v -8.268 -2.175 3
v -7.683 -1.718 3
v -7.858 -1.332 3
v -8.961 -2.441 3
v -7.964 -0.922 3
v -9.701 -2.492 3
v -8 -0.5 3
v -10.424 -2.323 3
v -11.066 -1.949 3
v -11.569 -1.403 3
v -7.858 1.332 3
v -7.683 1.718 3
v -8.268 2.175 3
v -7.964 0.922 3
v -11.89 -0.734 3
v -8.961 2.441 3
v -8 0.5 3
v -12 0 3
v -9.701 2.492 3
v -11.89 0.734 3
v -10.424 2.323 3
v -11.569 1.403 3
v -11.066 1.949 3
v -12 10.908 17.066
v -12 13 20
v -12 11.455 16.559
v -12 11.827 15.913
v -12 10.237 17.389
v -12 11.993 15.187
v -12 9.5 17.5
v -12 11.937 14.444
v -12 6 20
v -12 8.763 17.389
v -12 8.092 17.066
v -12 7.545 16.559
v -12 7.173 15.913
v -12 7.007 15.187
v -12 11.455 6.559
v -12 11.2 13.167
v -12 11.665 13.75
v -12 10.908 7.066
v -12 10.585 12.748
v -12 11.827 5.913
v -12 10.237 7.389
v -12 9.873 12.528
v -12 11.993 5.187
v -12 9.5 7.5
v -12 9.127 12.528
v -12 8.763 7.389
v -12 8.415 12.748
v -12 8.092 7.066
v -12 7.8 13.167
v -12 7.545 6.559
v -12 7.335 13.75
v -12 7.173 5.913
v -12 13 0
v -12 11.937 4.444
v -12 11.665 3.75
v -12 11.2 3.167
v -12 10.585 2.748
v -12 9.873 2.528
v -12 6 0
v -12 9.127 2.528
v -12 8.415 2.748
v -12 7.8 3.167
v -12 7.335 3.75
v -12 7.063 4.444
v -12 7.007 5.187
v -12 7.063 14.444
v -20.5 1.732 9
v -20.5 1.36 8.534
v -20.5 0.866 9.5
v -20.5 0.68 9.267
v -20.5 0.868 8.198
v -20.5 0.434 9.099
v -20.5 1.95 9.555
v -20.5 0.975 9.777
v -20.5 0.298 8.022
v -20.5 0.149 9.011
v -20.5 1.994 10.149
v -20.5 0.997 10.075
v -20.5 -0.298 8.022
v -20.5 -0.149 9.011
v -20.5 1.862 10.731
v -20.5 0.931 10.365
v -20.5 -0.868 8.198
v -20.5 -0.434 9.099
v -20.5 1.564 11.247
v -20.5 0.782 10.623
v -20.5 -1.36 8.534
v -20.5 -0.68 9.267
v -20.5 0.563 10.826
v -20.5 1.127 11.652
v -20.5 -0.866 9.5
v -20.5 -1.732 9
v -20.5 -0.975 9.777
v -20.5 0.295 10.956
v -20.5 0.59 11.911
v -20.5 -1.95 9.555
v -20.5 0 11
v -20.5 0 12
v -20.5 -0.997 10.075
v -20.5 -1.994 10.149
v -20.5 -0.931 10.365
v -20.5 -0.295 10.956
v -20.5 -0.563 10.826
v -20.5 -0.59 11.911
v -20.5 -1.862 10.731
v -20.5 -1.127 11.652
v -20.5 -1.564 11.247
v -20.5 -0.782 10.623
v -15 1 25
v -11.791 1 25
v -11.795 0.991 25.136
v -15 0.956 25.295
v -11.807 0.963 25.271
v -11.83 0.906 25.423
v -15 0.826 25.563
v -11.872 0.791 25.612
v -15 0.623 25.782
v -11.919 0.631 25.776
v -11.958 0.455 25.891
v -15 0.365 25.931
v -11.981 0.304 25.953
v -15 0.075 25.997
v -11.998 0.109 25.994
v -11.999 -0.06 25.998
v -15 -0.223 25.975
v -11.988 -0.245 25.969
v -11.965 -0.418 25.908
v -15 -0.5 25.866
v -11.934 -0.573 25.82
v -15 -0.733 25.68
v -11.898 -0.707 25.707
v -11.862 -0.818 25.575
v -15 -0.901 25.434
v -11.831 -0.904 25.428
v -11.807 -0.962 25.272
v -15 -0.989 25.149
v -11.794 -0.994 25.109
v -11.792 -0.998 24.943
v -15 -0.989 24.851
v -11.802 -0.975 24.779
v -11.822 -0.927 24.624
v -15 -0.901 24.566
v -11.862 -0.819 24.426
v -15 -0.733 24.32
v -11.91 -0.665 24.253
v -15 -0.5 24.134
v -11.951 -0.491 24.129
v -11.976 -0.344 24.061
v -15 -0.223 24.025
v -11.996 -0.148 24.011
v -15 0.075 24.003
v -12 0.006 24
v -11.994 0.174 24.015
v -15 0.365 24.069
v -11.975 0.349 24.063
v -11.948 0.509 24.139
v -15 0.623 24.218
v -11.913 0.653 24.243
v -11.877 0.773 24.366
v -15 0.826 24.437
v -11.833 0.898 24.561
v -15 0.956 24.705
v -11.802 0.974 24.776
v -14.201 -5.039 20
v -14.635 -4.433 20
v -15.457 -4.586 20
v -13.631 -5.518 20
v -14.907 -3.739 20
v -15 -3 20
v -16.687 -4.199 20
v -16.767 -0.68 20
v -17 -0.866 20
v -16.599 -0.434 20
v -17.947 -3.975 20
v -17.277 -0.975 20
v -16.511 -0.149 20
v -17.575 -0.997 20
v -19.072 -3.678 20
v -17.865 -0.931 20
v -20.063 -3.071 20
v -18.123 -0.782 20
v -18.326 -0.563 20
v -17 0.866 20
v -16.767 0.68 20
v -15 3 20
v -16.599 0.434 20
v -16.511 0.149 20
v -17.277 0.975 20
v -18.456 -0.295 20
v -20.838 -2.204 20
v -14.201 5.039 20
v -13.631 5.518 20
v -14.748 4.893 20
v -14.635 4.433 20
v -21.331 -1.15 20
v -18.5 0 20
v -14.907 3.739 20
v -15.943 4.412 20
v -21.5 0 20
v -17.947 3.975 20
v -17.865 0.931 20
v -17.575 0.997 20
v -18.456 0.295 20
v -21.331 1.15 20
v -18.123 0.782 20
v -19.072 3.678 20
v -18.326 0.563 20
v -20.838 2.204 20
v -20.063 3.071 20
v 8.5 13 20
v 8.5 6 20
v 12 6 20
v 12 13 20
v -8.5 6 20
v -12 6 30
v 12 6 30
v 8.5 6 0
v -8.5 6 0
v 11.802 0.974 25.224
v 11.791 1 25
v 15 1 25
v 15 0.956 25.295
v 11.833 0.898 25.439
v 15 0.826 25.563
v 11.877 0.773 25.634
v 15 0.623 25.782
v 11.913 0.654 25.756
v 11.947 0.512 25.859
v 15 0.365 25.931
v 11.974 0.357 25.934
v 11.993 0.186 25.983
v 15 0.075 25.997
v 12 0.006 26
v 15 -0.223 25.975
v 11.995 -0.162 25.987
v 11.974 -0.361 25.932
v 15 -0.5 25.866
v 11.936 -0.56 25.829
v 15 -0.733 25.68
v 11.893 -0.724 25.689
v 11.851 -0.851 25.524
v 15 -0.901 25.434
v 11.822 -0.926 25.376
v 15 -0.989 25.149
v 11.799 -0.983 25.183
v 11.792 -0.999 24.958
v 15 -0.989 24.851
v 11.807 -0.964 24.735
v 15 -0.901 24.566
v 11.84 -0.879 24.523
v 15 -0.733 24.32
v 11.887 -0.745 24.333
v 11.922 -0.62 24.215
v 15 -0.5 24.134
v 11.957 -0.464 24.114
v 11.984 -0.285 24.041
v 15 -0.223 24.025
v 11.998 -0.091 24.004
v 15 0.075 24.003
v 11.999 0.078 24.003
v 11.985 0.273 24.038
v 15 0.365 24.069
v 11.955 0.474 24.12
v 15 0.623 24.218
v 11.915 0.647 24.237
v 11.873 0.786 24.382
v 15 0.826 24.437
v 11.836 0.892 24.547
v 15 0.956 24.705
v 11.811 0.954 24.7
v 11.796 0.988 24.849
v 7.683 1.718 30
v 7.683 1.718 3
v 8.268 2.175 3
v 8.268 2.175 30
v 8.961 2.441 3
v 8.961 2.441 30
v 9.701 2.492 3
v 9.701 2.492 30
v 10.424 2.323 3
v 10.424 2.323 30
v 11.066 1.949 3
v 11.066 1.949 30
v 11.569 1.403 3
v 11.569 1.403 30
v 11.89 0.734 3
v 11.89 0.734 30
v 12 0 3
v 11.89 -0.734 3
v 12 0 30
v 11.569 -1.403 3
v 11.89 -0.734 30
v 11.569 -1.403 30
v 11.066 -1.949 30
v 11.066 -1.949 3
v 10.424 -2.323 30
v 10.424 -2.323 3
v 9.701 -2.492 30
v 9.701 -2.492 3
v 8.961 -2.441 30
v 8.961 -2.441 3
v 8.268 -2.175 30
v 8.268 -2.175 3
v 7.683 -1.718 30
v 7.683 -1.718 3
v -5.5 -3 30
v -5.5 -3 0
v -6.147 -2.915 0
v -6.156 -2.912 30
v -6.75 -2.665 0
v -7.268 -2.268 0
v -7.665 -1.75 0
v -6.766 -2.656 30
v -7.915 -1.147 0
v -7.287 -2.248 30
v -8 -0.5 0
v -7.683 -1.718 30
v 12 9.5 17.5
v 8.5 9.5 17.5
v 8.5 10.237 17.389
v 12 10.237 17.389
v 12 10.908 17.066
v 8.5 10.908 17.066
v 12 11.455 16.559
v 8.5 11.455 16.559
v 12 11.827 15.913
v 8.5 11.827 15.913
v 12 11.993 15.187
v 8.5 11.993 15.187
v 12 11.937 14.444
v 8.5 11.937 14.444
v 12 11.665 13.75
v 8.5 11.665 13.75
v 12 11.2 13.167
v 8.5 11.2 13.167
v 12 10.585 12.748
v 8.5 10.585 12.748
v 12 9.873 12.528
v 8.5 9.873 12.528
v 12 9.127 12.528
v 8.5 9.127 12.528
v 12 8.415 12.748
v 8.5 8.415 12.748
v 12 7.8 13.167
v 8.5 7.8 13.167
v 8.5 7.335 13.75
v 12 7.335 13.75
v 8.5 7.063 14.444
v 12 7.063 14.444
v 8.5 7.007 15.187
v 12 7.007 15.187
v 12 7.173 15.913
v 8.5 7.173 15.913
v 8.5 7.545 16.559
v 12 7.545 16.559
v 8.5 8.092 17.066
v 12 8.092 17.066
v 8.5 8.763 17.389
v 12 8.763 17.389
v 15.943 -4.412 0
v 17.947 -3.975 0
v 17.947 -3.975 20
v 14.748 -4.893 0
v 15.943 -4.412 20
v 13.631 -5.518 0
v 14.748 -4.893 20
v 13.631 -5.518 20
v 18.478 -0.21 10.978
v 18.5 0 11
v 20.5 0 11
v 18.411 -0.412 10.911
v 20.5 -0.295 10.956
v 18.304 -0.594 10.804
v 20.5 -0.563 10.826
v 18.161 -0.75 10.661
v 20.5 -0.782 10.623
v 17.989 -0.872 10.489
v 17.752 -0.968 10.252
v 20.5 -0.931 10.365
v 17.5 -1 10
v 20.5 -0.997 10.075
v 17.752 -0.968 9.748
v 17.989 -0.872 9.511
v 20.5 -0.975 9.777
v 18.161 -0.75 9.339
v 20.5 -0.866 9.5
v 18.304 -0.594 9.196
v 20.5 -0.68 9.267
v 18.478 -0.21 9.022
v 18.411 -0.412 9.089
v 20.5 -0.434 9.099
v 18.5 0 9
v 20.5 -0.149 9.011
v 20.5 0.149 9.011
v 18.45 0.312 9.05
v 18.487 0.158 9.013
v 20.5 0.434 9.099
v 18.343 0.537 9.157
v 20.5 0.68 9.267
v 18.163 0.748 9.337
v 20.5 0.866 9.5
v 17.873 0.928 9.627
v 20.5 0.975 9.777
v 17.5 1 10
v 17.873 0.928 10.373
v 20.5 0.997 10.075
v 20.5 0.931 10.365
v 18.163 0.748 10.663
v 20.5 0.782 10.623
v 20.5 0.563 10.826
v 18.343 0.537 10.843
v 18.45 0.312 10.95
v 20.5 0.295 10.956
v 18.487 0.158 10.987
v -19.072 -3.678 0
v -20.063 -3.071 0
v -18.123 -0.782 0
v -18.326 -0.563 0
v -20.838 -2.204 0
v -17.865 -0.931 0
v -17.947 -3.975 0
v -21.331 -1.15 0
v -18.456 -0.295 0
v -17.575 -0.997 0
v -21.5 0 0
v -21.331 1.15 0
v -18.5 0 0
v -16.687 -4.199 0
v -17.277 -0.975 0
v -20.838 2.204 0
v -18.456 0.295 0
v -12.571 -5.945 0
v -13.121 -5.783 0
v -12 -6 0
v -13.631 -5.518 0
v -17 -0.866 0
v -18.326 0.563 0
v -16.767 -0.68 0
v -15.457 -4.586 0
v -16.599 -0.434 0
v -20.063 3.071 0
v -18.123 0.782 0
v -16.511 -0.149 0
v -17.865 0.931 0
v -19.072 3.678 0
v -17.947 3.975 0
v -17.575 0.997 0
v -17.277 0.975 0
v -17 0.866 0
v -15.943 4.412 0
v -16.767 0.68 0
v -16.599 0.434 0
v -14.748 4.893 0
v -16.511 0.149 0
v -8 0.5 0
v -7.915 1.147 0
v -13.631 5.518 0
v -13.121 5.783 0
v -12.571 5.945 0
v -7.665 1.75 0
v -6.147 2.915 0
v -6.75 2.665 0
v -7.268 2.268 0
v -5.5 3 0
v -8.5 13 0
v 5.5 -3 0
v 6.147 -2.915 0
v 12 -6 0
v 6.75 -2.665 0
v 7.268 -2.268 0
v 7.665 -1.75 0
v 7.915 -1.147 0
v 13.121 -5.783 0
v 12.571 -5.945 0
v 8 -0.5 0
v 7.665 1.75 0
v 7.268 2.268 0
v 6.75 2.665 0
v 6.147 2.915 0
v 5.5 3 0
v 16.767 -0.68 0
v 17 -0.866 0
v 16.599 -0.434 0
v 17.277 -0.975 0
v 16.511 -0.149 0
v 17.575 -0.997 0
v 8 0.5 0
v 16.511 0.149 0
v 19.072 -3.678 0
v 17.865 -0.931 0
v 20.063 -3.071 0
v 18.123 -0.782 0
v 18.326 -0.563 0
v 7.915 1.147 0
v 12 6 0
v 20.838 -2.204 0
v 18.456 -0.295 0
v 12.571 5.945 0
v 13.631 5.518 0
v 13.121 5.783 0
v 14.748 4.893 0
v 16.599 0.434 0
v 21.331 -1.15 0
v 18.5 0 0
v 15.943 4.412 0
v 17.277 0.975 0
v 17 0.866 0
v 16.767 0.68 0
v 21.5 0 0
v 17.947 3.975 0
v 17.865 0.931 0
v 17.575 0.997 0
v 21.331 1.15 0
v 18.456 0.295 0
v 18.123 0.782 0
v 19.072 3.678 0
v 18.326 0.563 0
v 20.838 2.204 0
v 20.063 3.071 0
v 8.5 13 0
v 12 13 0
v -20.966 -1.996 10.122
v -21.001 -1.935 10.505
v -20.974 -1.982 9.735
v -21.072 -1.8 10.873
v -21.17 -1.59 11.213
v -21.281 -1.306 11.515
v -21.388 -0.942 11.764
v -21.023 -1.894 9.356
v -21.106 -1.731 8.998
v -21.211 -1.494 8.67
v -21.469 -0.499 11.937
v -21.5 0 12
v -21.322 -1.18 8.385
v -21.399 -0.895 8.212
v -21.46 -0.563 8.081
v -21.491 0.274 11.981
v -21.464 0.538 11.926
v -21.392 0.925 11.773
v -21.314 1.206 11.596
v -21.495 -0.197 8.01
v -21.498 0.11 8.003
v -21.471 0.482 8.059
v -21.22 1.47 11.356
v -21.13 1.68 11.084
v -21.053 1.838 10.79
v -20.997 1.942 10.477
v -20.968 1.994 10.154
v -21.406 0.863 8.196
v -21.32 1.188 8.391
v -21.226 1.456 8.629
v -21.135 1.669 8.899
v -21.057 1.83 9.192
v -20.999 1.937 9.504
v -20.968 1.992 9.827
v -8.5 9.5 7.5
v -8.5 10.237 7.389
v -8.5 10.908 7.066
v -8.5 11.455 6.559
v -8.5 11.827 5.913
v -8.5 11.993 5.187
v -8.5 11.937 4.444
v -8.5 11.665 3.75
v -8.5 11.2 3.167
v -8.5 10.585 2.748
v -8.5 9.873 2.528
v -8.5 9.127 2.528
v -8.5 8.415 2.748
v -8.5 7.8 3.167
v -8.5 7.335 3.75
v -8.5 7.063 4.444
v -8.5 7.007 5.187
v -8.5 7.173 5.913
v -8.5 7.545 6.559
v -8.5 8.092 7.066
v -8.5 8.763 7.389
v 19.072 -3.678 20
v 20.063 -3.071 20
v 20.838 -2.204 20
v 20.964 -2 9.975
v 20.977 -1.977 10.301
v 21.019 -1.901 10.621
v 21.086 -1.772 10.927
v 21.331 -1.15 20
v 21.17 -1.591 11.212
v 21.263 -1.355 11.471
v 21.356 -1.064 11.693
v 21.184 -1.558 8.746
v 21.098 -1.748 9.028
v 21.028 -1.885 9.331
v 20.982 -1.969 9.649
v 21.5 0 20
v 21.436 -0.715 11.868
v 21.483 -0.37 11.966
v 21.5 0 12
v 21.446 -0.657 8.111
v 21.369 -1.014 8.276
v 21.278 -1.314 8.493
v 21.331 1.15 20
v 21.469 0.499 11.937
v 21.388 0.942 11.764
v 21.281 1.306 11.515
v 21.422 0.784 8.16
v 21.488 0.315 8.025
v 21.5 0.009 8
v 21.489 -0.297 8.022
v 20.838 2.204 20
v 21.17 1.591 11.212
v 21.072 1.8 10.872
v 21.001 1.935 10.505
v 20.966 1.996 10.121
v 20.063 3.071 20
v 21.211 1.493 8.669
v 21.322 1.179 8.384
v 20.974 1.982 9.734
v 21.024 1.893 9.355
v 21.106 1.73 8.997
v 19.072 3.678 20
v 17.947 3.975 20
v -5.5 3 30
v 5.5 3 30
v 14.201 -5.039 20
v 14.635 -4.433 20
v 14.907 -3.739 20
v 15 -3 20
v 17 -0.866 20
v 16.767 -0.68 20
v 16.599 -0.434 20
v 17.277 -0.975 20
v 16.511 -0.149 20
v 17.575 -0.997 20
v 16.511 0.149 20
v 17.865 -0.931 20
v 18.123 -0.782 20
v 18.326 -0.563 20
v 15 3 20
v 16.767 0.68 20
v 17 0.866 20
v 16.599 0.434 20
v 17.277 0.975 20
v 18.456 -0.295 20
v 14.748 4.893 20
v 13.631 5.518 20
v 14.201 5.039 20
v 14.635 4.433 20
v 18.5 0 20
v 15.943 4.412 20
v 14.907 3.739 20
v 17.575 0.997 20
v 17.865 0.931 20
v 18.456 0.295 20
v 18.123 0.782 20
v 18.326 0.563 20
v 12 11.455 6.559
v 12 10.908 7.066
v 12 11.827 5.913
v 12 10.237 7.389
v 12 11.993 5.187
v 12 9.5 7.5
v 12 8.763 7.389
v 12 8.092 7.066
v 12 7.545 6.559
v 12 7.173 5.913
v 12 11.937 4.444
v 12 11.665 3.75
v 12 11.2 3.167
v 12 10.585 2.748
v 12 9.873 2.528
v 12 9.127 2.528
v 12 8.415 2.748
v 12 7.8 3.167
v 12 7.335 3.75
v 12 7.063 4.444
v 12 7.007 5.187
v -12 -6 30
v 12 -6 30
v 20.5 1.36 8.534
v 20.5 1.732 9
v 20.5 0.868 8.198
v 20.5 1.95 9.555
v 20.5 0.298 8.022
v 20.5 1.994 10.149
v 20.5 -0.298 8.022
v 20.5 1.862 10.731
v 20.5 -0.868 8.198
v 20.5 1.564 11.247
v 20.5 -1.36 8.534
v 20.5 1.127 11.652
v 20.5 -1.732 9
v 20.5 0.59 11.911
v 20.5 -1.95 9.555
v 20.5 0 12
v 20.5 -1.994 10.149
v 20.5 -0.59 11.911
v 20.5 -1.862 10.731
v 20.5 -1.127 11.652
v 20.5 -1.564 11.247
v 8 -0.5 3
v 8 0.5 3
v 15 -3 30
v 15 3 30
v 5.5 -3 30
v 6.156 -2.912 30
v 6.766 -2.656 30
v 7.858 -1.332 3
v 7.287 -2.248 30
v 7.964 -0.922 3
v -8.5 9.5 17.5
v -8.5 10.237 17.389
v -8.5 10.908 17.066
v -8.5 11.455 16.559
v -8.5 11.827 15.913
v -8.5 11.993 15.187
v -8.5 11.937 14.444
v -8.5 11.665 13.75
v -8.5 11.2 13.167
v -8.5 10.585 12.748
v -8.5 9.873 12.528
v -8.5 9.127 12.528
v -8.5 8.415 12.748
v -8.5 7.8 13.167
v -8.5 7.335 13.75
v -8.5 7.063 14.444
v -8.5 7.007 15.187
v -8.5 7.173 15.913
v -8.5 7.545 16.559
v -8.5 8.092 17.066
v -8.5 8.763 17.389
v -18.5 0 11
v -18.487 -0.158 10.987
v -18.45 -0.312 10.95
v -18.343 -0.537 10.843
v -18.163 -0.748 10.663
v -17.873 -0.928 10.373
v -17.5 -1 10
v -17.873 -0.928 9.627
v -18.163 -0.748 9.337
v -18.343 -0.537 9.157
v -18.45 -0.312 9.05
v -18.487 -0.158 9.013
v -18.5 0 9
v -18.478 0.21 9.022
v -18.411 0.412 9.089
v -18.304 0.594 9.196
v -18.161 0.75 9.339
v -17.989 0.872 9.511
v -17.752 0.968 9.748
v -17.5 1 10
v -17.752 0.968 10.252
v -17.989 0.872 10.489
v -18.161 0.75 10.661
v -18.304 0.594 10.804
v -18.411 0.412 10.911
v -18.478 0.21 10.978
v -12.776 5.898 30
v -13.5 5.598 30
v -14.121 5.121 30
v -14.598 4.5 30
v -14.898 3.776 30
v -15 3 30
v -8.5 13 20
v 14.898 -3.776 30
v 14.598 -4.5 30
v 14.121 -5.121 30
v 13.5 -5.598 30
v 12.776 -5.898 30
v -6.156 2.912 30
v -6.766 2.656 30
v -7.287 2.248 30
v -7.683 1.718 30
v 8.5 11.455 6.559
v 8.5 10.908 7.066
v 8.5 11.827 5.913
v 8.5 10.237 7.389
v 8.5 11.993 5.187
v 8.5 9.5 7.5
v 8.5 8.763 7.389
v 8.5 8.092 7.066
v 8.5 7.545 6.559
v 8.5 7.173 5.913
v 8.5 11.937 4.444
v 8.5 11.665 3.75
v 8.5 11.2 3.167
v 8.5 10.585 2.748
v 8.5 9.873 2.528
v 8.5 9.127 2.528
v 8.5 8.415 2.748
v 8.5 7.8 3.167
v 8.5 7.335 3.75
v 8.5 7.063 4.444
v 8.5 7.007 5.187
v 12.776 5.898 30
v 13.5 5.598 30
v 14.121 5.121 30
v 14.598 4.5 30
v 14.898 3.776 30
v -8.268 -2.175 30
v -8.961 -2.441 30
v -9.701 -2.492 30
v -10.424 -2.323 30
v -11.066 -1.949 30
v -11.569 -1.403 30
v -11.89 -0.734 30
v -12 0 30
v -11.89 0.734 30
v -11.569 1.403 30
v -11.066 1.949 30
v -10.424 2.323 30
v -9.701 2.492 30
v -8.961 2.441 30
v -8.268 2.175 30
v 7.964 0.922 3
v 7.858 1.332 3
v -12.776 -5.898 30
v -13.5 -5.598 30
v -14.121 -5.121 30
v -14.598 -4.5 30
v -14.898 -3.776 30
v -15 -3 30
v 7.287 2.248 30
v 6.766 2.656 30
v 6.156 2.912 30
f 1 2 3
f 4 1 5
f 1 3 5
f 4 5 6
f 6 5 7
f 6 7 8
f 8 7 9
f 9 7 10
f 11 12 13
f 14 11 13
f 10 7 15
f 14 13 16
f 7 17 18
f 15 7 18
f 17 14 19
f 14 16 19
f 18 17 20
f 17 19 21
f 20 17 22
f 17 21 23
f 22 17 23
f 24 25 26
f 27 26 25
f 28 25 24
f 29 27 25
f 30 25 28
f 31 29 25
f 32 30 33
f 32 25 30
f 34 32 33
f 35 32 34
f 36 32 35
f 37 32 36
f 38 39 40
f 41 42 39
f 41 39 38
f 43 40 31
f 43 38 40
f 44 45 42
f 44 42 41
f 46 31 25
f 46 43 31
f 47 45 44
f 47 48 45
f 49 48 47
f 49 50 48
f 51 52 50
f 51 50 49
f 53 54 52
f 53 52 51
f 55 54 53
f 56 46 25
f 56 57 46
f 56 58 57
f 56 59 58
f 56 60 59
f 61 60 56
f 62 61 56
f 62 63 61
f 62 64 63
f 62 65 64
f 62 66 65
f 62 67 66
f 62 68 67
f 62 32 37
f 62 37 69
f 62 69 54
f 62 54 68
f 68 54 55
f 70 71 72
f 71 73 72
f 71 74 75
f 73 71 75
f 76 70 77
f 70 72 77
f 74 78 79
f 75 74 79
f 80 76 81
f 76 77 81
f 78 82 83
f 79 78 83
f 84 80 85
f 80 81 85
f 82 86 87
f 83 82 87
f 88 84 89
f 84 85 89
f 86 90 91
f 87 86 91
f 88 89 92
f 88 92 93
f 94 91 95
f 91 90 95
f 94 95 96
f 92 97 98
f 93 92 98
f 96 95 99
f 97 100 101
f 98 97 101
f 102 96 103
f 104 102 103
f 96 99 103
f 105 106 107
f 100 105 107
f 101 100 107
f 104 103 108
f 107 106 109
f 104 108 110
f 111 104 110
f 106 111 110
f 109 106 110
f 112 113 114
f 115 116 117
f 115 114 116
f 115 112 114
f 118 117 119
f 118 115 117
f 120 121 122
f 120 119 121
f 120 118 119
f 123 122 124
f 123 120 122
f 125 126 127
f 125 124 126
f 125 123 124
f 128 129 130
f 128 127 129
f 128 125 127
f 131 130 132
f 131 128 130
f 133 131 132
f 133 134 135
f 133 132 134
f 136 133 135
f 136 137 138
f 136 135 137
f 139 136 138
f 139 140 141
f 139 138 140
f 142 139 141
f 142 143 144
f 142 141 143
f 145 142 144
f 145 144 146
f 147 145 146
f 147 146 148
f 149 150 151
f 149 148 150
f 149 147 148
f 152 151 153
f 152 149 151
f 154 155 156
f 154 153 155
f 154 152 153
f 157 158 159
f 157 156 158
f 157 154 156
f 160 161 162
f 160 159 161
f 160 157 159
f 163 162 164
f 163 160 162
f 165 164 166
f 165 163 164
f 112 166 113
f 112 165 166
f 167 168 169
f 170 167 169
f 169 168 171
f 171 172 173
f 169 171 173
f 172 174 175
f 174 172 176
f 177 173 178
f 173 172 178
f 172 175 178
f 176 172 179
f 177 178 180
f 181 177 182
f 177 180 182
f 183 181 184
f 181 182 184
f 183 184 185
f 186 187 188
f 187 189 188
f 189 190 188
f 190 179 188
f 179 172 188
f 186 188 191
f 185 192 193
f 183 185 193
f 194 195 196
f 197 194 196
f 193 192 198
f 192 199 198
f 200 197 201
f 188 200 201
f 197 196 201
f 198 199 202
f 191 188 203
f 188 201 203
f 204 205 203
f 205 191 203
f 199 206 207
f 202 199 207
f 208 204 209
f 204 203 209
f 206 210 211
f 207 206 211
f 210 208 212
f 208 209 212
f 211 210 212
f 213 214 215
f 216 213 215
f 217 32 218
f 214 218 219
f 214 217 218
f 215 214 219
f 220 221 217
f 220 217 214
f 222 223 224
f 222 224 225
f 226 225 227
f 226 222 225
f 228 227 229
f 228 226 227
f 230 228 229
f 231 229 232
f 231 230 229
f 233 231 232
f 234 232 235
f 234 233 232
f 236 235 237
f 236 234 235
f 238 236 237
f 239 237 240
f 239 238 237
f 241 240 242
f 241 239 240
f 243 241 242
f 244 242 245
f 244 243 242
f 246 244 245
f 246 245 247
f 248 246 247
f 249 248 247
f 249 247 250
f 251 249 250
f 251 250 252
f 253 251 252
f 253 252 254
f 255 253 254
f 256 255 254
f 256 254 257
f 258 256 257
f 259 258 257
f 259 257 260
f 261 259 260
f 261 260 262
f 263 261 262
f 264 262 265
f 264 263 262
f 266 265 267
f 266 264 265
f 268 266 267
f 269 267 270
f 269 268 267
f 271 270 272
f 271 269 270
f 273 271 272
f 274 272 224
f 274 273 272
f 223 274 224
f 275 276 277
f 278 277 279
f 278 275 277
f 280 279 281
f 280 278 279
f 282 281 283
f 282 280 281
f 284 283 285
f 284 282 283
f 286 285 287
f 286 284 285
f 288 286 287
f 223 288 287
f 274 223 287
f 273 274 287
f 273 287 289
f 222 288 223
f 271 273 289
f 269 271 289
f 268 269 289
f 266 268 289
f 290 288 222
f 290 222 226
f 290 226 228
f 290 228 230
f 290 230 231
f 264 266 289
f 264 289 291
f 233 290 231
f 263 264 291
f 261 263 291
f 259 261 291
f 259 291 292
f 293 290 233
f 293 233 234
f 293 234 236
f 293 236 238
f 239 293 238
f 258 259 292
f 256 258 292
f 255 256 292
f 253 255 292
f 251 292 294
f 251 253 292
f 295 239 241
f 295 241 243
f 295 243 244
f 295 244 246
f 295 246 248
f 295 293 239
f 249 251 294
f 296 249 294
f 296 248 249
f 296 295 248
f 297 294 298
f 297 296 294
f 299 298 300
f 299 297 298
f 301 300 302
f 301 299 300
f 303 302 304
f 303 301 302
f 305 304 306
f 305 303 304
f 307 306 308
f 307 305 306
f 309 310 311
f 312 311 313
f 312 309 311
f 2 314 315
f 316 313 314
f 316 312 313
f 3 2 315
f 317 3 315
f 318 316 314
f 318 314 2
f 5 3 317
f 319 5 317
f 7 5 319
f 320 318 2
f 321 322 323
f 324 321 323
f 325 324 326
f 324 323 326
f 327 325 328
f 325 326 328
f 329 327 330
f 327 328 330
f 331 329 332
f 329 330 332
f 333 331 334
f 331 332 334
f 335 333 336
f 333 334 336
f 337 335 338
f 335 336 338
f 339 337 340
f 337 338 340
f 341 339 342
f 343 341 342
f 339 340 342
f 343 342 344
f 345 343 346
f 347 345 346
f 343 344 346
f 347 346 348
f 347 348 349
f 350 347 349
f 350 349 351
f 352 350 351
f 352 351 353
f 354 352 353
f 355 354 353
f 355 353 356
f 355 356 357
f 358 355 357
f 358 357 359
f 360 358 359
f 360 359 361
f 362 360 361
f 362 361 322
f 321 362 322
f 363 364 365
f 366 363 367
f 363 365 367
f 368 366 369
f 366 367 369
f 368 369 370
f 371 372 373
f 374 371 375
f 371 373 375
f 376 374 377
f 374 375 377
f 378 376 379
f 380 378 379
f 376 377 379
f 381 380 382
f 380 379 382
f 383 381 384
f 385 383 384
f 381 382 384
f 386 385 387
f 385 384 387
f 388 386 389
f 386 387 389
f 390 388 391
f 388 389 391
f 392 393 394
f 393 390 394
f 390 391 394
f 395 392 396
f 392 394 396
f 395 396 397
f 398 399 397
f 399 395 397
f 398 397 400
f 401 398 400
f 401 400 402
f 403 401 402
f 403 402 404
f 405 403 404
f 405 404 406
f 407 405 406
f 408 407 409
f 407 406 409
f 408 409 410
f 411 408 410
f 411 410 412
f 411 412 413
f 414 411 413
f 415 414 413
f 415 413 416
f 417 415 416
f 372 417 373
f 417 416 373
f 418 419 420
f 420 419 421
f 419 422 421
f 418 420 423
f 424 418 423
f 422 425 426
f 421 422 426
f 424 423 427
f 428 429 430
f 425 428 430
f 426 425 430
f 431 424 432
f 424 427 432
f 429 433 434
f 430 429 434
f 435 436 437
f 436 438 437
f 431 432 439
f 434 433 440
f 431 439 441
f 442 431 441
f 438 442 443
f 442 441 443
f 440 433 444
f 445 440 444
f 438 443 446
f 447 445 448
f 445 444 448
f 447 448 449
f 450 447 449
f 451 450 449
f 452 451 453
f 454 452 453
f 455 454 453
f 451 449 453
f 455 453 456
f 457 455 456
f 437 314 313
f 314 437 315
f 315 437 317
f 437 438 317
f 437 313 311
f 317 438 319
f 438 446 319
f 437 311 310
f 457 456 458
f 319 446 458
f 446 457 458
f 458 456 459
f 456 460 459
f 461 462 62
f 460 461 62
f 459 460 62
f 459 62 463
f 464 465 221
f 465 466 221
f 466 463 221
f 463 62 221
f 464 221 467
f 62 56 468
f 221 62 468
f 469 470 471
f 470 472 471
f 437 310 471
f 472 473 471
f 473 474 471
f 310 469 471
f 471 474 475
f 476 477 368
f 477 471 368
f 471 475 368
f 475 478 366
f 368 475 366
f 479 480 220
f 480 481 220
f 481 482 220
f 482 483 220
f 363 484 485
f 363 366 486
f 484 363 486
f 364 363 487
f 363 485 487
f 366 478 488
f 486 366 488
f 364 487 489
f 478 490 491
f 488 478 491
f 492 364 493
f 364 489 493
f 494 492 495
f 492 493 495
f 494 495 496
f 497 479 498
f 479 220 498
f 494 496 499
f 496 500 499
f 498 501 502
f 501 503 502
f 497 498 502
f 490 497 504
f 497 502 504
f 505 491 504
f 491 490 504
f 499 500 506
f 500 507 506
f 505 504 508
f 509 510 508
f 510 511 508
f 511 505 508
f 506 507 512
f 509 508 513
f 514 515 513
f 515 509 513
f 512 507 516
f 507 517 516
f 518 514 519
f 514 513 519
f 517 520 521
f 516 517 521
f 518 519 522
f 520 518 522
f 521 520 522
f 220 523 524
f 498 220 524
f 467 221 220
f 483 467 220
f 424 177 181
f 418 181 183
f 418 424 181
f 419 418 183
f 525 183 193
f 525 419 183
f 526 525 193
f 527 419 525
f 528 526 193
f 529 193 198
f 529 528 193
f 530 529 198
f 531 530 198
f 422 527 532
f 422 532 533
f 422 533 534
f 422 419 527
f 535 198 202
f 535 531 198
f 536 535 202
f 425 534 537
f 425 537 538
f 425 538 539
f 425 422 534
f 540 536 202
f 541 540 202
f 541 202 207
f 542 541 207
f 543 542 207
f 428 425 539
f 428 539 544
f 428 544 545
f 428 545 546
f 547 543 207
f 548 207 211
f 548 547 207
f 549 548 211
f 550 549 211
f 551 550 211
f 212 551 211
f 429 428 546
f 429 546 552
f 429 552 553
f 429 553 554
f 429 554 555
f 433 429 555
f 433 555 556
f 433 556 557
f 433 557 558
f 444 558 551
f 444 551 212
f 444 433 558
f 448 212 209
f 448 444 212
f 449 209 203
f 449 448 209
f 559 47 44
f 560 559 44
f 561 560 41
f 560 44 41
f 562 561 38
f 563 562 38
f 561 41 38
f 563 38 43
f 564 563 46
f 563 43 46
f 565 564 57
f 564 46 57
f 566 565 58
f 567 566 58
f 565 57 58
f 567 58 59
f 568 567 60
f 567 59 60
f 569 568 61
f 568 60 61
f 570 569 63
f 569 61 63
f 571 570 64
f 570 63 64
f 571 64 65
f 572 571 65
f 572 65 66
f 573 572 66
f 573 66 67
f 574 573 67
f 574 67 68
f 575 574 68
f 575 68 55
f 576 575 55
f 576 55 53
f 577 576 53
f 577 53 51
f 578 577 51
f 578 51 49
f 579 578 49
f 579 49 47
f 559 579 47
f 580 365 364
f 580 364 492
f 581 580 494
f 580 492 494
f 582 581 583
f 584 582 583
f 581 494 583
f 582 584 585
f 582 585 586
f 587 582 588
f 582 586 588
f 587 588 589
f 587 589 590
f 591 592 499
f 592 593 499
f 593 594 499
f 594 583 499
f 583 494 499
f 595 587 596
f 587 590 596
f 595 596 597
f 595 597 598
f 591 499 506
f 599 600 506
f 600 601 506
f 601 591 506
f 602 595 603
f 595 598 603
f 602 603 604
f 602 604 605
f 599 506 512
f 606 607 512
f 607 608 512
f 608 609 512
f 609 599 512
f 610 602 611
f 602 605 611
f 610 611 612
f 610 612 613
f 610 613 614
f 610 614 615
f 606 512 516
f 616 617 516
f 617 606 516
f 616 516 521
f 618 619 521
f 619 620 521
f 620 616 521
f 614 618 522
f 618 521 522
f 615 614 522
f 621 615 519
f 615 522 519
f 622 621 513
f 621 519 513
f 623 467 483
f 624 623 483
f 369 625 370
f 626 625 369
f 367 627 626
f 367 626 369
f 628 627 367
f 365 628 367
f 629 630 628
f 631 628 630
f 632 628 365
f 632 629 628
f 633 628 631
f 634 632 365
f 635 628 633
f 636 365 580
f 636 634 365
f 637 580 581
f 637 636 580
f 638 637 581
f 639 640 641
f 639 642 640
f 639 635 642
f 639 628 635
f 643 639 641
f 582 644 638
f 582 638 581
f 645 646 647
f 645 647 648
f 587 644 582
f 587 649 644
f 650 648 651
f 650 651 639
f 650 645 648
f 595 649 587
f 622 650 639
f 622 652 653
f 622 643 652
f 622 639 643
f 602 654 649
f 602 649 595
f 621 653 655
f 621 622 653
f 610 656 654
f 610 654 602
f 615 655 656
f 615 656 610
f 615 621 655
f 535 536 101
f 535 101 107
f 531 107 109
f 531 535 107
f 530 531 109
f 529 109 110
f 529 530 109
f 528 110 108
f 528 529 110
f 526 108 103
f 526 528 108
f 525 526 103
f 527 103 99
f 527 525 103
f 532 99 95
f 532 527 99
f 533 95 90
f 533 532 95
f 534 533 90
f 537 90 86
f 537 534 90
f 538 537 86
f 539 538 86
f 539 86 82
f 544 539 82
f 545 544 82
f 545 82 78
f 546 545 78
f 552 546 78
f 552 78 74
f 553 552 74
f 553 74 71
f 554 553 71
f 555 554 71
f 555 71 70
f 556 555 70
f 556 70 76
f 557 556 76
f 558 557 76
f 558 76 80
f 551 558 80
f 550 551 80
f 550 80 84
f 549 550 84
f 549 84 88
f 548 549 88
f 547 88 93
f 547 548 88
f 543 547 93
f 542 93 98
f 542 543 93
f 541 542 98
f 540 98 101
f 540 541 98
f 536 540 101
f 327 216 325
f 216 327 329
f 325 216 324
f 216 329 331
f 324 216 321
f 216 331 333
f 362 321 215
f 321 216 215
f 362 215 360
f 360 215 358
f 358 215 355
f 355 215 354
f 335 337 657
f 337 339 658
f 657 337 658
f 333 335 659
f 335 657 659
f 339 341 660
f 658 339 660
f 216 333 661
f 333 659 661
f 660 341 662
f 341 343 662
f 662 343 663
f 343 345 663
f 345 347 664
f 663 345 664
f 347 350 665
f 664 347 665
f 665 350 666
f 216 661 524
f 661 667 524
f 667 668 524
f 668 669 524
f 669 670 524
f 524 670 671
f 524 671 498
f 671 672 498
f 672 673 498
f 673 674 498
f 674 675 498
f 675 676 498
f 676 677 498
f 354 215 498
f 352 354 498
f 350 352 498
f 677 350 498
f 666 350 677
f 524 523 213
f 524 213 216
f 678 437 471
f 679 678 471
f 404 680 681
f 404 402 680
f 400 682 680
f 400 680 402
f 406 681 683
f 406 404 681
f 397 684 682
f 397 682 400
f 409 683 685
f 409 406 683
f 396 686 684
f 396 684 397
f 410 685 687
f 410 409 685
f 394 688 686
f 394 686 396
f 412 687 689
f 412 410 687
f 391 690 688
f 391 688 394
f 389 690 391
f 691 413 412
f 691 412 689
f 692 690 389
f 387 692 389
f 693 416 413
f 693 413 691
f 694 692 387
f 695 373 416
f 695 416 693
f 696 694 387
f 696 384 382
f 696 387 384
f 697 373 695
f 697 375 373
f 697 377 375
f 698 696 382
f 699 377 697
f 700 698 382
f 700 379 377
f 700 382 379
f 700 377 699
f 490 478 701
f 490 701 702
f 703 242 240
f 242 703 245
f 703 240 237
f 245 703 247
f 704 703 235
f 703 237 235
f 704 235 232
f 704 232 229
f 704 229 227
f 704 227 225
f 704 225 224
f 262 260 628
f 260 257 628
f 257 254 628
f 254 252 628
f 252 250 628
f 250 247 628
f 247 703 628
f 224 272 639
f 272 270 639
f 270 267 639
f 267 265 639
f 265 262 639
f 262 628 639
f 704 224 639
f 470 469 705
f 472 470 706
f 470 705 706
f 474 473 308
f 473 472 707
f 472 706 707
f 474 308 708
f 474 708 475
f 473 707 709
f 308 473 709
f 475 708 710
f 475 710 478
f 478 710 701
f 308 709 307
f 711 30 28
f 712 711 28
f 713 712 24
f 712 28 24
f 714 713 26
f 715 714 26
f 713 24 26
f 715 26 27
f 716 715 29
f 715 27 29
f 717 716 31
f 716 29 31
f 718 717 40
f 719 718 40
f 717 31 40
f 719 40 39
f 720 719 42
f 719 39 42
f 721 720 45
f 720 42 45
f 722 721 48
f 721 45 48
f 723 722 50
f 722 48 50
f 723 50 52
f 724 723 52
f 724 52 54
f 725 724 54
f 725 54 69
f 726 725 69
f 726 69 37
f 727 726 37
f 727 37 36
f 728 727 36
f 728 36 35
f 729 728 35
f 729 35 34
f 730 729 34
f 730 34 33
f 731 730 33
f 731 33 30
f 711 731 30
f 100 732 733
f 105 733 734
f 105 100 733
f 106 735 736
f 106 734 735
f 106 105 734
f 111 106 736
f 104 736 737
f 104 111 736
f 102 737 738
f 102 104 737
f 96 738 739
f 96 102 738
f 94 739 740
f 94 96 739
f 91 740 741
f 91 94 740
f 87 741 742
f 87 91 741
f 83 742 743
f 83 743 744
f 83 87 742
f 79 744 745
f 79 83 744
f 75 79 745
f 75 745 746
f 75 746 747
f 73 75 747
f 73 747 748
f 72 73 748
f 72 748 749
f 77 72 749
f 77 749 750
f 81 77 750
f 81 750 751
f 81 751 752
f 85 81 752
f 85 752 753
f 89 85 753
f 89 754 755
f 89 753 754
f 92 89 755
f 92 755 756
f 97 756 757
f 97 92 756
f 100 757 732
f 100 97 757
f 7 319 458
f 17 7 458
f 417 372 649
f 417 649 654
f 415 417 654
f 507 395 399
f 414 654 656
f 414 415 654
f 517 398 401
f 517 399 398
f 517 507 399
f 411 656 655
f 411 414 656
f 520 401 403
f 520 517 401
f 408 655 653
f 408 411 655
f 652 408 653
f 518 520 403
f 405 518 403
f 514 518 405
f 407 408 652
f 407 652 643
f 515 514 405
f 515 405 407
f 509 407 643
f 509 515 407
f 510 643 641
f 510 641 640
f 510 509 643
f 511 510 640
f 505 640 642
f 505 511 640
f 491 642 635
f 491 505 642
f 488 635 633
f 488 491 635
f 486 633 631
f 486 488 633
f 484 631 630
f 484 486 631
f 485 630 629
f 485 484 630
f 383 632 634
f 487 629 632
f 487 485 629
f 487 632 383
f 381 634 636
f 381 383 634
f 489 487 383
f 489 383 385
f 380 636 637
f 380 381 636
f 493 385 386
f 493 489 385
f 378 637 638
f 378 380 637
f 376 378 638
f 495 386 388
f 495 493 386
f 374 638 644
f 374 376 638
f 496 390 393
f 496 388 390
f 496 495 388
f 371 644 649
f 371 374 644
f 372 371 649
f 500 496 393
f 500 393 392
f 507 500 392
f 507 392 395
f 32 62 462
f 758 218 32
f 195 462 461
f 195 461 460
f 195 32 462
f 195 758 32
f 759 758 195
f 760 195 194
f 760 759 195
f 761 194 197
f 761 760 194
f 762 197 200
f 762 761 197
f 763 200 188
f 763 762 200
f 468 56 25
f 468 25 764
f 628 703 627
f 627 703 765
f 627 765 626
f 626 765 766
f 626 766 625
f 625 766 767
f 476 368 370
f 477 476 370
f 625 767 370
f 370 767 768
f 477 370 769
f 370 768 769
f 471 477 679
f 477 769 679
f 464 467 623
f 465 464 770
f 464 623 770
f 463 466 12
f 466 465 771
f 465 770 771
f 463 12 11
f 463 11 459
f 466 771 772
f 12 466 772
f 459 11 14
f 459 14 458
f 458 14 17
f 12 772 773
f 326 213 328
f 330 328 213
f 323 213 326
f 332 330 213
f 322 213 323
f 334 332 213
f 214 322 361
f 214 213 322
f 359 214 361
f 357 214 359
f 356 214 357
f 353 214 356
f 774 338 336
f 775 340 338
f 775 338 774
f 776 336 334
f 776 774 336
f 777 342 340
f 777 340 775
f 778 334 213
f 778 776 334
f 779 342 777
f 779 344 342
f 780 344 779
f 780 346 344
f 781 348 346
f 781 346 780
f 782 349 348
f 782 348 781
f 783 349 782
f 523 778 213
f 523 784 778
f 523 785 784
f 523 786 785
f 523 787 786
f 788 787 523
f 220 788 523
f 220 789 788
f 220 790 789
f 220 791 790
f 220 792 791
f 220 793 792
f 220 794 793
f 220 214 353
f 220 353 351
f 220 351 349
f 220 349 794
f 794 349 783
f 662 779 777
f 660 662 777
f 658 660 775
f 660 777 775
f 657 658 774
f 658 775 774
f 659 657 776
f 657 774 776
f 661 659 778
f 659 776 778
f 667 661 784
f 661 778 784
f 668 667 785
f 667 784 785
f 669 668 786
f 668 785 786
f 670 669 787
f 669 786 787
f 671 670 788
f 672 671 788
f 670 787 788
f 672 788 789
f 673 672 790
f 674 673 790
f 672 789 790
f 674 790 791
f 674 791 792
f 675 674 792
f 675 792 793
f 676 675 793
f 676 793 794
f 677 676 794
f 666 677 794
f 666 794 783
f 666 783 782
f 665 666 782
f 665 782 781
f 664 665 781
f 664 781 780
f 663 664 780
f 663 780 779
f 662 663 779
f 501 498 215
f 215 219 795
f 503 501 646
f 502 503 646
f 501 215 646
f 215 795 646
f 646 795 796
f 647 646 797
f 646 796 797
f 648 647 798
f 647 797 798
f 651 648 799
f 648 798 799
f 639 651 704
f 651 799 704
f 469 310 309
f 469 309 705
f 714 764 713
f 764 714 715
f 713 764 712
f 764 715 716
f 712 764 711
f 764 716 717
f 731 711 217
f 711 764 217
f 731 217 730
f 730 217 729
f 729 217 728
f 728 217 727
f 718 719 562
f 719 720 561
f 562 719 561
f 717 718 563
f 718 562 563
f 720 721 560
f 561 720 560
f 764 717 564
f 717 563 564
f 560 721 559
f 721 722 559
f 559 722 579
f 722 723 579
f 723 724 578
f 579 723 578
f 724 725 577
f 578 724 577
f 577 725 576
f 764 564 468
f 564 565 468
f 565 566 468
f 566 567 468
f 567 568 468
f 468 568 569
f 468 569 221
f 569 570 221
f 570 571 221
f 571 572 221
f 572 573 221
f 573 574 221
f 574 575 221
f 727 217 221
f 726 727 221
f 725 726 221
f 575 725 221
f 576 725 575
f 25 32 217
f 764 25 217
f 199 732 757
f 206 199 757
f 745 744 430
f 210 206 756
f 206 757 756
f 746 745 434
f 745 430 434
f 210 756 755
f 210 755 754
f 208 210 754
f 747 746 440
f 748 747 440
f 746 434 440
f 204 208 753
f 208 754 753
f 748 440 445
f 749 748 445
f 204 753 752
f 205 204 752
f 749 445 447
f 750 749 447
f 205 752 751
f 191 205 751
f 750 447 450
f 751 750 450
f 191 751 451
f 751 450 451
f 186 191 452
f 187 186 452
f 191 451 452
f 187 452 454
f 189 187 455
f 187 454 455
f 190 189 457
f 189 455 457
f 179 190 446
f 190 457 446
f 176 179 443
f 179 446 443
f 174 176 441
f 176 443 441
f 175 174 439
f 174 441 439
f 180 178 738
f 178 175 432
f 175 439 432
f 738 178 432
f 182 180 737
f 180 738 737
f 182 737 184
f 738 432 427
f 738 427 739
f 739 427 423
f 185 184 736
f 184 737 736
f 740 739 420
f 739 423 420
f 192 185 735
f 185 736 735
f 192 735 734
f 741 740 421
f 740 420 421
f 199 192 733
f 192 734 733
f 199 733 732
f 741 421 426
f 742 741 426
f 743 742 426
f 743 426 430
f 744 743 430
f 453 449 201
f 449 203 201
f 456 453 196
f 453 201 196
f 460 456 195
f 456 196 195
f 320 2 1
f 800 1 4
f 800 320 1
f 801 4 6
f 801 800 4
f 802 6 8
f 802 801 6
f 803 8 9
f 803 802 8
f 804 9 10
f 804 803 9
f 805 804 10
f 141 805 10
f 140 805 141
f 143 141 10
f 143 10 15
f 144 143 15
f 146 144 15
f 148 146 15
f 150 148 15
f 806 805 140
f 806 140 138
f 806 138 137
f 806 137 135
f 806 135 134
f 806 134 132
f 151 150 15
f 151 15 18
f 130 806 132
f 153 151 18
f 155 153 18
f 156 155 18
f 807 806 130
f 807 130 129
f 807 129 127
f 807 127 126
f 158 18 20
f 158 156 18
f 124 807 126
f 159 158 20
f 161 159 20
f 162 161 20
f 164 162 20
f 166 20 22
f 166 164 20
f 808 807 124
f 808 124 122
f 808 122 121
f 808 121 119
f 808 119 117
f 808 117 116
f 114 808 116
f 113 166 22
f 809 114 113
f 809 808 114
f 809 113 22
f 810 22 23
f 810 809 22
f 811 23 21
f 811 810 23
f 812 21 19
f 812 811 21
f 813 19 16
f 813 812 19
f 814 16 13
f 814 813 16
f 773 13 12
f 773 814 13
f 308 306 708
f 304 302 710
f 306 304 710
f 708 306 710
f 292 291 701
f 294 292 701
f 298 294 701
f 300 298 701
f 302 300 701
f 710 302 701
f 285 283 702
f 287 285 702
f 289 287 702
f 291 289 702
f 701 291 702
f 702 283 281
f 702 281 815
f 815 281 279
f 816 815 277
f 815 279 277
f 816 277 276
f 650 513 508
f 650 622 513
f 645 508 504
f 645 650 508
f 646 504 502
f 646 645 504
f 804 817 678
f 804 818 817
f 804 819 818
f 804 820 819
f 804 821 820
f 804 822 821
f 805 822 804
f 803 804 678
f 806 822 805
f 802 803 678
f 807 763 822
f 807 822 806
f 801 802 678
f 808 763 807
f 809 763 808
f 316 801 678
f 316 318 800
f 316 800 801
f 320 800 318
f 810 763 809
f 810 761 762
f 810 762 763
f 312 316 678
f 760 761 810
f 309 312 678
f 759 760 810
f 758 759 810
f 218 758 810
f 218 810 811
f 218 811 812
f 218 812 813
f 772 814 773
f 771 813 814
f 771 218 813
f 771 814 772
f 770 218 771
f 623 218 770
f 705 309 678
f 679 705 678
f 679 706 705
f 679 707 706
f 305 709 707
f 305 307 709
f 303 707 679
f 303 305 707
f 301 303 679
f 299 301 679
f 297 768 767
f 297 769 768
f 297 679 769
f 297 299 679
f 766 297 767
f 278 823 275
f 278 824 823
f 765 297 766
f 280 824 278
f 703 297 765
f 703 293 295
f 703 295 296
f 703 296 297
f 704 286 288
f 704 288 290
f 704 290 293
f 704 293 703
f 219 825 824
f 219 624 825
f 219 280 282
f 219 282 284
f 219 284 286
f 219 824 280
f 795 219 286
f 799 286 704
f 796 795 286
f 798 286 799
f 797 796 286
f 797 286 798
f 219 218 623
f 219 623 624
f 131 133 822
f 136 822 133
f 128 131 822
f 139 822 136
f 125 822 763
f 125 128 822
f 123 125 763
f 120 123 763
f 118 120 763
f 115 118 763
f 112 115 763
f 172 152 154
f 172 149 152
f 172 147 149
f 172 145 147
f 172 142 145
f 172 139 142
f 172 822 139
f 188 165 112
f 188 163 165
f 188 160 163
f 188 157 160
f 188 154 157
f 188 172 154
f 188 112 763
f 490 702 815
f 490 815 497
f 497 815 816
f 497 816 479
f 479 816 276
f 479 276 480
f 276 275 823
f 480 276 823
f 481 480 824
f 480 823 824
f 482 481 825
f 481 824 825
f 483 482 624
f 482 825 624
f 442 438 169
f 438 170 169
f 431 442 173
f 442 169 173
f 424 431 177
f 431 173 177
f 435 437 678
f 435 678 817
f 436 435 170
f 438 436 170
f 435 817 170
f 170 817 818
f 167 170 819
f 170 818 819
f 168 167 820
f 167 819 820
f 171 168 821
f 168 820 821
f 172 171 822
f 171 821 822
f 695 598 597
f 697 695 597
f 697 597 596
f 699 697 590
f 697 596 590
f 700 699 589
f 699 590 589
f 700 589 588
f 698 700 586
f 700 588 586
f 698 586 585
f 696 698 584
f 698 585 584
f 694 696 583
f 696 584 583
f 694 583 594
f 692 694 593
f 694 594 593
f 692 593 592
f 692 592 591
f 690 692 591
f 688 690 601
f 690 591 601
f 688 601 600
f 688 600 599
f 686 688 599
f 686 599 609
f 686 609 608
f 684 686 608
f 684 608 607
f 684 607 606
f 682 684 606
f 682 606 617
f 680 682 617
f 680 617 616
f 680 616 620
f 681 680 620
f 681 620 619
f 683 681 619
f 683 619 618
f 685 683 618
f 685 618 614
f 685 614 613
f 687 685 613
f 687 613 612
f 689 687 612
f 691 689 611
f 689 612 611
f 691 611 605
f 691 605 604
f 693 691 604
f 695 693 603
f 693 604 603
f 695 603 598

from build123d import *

# Parameters (mm, degrees)
SKETCH1_W               = 30
SKETCH1_H               = 12
SKETCH1_W_2             = 16
SKETCH1_H_2             = 6
BOSS_EXTRUDE1_DEPTH     = 30
FILLET1_R               = 2.5
CUT_EXTRUDE6_DEPTH      = 43.848570571
CUT_EXTRUDE6_DEPTH_BACK = 43.848570571
SKETCH22_R              = 1
SKETCH18_R              = 2.5
SKETCH18_R_2            = 2
SKETCH18_R_3            = 0.85
CUT_EXTRUDE3_DEPTH      = 27
FILLET2_R               = 3
SKETCH23_W              = 3.5
SKETCH23_H              = 20
BOSS_EXTRUDE3_DEPTH     = 7
SKETCH24_R              = 2.5
CUT_EXTRUDE7_DEPTH      = 74
SKETCH19_R              = 4
SKETCH19_R_2            = 1
BOSS_EXTRUDE2_DEPTH     = 20
SKETCH25_R              = 1
CUT_EXTRUDE8_DEPTH      = 4
SKETCH26_R              = 2
CUT_EXTRUDE9_DEPTH      = 1
FILLET3_R               = 10


with BuildPart() as part:
    # Sketch1 → Boss-Extrude1 (new body)
    with BuildSketch(Plane.XY):
        Rectangle(SKETCH1_W, SKETCH1_H)
        Rectangle(SKETCH1_W_2, SKETCH1_H_2, mode=Mode.SUBTRACT)
    extrude(amount=BOSS_EXTRUDE1_DEPTH)

    # Fillet1
    fillet1_edges = [part.edges().sort_by_distance(p)[0] for p in [
        (8, -3, 15),
        (8, 3, 15),
        (-8, 3, 15),
        (-8, -3, 15),
    ]]
    fillet(fillet1_edges, radius=FILLET1_R)

    # Sketch22 → Cut-Extrude6 (cut, two sides: drawn at the far end of the back side and taken through both)
    with BuildSketch(Plane(origin=(15, 0, 0), x_dir=(0, 0, -1), z_dir=(1, 0, 0)).offset(-CUT_EXTRUDE6_DEPTH_BACK)):
        with Locations(Location((-25, 0, 0), (0, 0, 90))):
            Circle(SKETCH22_R)
    extrude(amount=CUT_EXTRUDE6_DEPTH + CUT_EXTRUDE6_DEPTH_BACK, mode=Mode.SUBTRACT)

    # Sketch18 → Cut-Extrude3 (cut)
    with BuildSketch(Plane(origin=(0, 0, 30), x_dir=(-1, 0, 0), z_dir=(0, 0, -1))):
        with Locations((-9.5, 0)):
            Circle(SKETCH18_R)
        with Locations((9.5, 0)):
            Circle(SKETCH18_R)
        Circle(SKETCH18_R_2)
        with Locations((4.5, 0)):
            Circle(SKETCH18_R_3)
        with Locations((-4.5, 0)):
            Circle(SKETCH18_R_3)
    extrude(amount=CUT_EXTRUDE3_DEPTH, mode=Mode.SUBTRACT)

    # Fillet2
    fillet2_edges = [part.edges().sort_by_distance(p)[0] for p in [
        (15, -6, 15),
        (-15, -6, 15),
        (-15, 6, 15),
        (15, 6, 15),
    ]]
    fillet(fillet2_edges, radius=FILLET2_R)

    # Sketch23 → Boss-Extrude3 (add)
    with BuildSketch(Plane(origin=(0, 6, 0), x_dir=(1, 0, 0), z_dir=(0, 1, 0))):
        with Locations((-10.25, -10)):
            Rectangle(SKETCH23_W, SKETCH23_H)
        with Locations((10.25, -10)):
            Rectangle(SKETCH23_W, SKETCH23_H)
    extrude(amount=BOSS_EXTRUDE3_DEPTH)

    # Sketch24 → Cut-Extrude7 (cut)
    with BuildSketch(Plane.ZY.offset(12)):
        with Locations((15, 9.5)):
            Circle(SKETCH24_R)
        with Locations((5, 9.5)):
            Circle(SKETCH24_R)
    extrude(amount=-CUT_EXTRUDE7_DEPTH, mode=Mode.SUBTRACT)

    # Sketch19 → Boss-Extrude2 (add)
    with BuildSketch(Plane(origin=(0, 0, 0), x_dir=(-1, 0, 0), z_dir=(0, 0, -1))):
        with Locations((17.5, 0)):
            Circle(SKETCH19_R)
        with Locations((17.5, 0)):
            Circle(SKETCH19_R_2, mode=Mode.SUBTRACT)
    boss_extrude2 = extrude(amount=-BOSS_EXTRUDE2_DEPTH)

    # Sketch25 → Cut-Extrude8 (cut)
    with BuildSketch(Plane(origin=(-21.5, 0, 0), x_dir=(0, 0, -1), z_dir=(1, 0, 0))):
        with Locations(Location((-10, 0, 0), (0, 0, 180))):
            Circle(SKETCH25_R)
    cut_extrude8 = extrude(amount=CUT_EXTRUDE8_DEPTH, mode=Mode.SUBTRACT)

    # Sketch26 → Cut-Extrude9 (cut)
    with BuildSketch(Plane(origin=(-21.5, 0, 0), x_dir=(0, 0, -1), z_dir=(1, 0, 0))):
        with Locations(Location((-10, 0, 0), (0, 0, 180))):
            Circle(SKETCH26_R)
    cut_extrude9 = extrude(amount=CUT_EXTRUDE9_DEPTH, mode=Mode.SUBTRACT)

    # Mirror1: Boss-Extrude2, Cut-Extrude8, Cut-Extrude9 across plane
    add(boss_extrude2.mirror(Plane(origin=(0, 0, 0), x_dir=(0, 0, 1), z_dir=(1, 0, 0))))
    add(cut_extrude8.mirror(Plane(origin=(0, 0, 0), x_dir=(0, 0, 1), z_dir=(1, 0, 0))), mode=Mode.SUBTRACT)
    add(cut_extrude9.mirror(Plane(origin=(0, 0, 0), x_dir=(0, 0, 1), z_dir=(1, 0, 0))), mode=Mode.SUBTRACT)

    # Fillet3
    fillet3_edges = [part.edges().sort_by_distance(p)[0] for p in [
        (-14.99757668, 3.120557246, 10),
        (-14.99757668, -3.120557246, 10),
        (14.99757668, 3.120557246, 10),
        (14.99757668, -3.120557246, 10),
    ]]
    fillet(fillet3_edges, radius=FILLET3_R)


solid = part.part
